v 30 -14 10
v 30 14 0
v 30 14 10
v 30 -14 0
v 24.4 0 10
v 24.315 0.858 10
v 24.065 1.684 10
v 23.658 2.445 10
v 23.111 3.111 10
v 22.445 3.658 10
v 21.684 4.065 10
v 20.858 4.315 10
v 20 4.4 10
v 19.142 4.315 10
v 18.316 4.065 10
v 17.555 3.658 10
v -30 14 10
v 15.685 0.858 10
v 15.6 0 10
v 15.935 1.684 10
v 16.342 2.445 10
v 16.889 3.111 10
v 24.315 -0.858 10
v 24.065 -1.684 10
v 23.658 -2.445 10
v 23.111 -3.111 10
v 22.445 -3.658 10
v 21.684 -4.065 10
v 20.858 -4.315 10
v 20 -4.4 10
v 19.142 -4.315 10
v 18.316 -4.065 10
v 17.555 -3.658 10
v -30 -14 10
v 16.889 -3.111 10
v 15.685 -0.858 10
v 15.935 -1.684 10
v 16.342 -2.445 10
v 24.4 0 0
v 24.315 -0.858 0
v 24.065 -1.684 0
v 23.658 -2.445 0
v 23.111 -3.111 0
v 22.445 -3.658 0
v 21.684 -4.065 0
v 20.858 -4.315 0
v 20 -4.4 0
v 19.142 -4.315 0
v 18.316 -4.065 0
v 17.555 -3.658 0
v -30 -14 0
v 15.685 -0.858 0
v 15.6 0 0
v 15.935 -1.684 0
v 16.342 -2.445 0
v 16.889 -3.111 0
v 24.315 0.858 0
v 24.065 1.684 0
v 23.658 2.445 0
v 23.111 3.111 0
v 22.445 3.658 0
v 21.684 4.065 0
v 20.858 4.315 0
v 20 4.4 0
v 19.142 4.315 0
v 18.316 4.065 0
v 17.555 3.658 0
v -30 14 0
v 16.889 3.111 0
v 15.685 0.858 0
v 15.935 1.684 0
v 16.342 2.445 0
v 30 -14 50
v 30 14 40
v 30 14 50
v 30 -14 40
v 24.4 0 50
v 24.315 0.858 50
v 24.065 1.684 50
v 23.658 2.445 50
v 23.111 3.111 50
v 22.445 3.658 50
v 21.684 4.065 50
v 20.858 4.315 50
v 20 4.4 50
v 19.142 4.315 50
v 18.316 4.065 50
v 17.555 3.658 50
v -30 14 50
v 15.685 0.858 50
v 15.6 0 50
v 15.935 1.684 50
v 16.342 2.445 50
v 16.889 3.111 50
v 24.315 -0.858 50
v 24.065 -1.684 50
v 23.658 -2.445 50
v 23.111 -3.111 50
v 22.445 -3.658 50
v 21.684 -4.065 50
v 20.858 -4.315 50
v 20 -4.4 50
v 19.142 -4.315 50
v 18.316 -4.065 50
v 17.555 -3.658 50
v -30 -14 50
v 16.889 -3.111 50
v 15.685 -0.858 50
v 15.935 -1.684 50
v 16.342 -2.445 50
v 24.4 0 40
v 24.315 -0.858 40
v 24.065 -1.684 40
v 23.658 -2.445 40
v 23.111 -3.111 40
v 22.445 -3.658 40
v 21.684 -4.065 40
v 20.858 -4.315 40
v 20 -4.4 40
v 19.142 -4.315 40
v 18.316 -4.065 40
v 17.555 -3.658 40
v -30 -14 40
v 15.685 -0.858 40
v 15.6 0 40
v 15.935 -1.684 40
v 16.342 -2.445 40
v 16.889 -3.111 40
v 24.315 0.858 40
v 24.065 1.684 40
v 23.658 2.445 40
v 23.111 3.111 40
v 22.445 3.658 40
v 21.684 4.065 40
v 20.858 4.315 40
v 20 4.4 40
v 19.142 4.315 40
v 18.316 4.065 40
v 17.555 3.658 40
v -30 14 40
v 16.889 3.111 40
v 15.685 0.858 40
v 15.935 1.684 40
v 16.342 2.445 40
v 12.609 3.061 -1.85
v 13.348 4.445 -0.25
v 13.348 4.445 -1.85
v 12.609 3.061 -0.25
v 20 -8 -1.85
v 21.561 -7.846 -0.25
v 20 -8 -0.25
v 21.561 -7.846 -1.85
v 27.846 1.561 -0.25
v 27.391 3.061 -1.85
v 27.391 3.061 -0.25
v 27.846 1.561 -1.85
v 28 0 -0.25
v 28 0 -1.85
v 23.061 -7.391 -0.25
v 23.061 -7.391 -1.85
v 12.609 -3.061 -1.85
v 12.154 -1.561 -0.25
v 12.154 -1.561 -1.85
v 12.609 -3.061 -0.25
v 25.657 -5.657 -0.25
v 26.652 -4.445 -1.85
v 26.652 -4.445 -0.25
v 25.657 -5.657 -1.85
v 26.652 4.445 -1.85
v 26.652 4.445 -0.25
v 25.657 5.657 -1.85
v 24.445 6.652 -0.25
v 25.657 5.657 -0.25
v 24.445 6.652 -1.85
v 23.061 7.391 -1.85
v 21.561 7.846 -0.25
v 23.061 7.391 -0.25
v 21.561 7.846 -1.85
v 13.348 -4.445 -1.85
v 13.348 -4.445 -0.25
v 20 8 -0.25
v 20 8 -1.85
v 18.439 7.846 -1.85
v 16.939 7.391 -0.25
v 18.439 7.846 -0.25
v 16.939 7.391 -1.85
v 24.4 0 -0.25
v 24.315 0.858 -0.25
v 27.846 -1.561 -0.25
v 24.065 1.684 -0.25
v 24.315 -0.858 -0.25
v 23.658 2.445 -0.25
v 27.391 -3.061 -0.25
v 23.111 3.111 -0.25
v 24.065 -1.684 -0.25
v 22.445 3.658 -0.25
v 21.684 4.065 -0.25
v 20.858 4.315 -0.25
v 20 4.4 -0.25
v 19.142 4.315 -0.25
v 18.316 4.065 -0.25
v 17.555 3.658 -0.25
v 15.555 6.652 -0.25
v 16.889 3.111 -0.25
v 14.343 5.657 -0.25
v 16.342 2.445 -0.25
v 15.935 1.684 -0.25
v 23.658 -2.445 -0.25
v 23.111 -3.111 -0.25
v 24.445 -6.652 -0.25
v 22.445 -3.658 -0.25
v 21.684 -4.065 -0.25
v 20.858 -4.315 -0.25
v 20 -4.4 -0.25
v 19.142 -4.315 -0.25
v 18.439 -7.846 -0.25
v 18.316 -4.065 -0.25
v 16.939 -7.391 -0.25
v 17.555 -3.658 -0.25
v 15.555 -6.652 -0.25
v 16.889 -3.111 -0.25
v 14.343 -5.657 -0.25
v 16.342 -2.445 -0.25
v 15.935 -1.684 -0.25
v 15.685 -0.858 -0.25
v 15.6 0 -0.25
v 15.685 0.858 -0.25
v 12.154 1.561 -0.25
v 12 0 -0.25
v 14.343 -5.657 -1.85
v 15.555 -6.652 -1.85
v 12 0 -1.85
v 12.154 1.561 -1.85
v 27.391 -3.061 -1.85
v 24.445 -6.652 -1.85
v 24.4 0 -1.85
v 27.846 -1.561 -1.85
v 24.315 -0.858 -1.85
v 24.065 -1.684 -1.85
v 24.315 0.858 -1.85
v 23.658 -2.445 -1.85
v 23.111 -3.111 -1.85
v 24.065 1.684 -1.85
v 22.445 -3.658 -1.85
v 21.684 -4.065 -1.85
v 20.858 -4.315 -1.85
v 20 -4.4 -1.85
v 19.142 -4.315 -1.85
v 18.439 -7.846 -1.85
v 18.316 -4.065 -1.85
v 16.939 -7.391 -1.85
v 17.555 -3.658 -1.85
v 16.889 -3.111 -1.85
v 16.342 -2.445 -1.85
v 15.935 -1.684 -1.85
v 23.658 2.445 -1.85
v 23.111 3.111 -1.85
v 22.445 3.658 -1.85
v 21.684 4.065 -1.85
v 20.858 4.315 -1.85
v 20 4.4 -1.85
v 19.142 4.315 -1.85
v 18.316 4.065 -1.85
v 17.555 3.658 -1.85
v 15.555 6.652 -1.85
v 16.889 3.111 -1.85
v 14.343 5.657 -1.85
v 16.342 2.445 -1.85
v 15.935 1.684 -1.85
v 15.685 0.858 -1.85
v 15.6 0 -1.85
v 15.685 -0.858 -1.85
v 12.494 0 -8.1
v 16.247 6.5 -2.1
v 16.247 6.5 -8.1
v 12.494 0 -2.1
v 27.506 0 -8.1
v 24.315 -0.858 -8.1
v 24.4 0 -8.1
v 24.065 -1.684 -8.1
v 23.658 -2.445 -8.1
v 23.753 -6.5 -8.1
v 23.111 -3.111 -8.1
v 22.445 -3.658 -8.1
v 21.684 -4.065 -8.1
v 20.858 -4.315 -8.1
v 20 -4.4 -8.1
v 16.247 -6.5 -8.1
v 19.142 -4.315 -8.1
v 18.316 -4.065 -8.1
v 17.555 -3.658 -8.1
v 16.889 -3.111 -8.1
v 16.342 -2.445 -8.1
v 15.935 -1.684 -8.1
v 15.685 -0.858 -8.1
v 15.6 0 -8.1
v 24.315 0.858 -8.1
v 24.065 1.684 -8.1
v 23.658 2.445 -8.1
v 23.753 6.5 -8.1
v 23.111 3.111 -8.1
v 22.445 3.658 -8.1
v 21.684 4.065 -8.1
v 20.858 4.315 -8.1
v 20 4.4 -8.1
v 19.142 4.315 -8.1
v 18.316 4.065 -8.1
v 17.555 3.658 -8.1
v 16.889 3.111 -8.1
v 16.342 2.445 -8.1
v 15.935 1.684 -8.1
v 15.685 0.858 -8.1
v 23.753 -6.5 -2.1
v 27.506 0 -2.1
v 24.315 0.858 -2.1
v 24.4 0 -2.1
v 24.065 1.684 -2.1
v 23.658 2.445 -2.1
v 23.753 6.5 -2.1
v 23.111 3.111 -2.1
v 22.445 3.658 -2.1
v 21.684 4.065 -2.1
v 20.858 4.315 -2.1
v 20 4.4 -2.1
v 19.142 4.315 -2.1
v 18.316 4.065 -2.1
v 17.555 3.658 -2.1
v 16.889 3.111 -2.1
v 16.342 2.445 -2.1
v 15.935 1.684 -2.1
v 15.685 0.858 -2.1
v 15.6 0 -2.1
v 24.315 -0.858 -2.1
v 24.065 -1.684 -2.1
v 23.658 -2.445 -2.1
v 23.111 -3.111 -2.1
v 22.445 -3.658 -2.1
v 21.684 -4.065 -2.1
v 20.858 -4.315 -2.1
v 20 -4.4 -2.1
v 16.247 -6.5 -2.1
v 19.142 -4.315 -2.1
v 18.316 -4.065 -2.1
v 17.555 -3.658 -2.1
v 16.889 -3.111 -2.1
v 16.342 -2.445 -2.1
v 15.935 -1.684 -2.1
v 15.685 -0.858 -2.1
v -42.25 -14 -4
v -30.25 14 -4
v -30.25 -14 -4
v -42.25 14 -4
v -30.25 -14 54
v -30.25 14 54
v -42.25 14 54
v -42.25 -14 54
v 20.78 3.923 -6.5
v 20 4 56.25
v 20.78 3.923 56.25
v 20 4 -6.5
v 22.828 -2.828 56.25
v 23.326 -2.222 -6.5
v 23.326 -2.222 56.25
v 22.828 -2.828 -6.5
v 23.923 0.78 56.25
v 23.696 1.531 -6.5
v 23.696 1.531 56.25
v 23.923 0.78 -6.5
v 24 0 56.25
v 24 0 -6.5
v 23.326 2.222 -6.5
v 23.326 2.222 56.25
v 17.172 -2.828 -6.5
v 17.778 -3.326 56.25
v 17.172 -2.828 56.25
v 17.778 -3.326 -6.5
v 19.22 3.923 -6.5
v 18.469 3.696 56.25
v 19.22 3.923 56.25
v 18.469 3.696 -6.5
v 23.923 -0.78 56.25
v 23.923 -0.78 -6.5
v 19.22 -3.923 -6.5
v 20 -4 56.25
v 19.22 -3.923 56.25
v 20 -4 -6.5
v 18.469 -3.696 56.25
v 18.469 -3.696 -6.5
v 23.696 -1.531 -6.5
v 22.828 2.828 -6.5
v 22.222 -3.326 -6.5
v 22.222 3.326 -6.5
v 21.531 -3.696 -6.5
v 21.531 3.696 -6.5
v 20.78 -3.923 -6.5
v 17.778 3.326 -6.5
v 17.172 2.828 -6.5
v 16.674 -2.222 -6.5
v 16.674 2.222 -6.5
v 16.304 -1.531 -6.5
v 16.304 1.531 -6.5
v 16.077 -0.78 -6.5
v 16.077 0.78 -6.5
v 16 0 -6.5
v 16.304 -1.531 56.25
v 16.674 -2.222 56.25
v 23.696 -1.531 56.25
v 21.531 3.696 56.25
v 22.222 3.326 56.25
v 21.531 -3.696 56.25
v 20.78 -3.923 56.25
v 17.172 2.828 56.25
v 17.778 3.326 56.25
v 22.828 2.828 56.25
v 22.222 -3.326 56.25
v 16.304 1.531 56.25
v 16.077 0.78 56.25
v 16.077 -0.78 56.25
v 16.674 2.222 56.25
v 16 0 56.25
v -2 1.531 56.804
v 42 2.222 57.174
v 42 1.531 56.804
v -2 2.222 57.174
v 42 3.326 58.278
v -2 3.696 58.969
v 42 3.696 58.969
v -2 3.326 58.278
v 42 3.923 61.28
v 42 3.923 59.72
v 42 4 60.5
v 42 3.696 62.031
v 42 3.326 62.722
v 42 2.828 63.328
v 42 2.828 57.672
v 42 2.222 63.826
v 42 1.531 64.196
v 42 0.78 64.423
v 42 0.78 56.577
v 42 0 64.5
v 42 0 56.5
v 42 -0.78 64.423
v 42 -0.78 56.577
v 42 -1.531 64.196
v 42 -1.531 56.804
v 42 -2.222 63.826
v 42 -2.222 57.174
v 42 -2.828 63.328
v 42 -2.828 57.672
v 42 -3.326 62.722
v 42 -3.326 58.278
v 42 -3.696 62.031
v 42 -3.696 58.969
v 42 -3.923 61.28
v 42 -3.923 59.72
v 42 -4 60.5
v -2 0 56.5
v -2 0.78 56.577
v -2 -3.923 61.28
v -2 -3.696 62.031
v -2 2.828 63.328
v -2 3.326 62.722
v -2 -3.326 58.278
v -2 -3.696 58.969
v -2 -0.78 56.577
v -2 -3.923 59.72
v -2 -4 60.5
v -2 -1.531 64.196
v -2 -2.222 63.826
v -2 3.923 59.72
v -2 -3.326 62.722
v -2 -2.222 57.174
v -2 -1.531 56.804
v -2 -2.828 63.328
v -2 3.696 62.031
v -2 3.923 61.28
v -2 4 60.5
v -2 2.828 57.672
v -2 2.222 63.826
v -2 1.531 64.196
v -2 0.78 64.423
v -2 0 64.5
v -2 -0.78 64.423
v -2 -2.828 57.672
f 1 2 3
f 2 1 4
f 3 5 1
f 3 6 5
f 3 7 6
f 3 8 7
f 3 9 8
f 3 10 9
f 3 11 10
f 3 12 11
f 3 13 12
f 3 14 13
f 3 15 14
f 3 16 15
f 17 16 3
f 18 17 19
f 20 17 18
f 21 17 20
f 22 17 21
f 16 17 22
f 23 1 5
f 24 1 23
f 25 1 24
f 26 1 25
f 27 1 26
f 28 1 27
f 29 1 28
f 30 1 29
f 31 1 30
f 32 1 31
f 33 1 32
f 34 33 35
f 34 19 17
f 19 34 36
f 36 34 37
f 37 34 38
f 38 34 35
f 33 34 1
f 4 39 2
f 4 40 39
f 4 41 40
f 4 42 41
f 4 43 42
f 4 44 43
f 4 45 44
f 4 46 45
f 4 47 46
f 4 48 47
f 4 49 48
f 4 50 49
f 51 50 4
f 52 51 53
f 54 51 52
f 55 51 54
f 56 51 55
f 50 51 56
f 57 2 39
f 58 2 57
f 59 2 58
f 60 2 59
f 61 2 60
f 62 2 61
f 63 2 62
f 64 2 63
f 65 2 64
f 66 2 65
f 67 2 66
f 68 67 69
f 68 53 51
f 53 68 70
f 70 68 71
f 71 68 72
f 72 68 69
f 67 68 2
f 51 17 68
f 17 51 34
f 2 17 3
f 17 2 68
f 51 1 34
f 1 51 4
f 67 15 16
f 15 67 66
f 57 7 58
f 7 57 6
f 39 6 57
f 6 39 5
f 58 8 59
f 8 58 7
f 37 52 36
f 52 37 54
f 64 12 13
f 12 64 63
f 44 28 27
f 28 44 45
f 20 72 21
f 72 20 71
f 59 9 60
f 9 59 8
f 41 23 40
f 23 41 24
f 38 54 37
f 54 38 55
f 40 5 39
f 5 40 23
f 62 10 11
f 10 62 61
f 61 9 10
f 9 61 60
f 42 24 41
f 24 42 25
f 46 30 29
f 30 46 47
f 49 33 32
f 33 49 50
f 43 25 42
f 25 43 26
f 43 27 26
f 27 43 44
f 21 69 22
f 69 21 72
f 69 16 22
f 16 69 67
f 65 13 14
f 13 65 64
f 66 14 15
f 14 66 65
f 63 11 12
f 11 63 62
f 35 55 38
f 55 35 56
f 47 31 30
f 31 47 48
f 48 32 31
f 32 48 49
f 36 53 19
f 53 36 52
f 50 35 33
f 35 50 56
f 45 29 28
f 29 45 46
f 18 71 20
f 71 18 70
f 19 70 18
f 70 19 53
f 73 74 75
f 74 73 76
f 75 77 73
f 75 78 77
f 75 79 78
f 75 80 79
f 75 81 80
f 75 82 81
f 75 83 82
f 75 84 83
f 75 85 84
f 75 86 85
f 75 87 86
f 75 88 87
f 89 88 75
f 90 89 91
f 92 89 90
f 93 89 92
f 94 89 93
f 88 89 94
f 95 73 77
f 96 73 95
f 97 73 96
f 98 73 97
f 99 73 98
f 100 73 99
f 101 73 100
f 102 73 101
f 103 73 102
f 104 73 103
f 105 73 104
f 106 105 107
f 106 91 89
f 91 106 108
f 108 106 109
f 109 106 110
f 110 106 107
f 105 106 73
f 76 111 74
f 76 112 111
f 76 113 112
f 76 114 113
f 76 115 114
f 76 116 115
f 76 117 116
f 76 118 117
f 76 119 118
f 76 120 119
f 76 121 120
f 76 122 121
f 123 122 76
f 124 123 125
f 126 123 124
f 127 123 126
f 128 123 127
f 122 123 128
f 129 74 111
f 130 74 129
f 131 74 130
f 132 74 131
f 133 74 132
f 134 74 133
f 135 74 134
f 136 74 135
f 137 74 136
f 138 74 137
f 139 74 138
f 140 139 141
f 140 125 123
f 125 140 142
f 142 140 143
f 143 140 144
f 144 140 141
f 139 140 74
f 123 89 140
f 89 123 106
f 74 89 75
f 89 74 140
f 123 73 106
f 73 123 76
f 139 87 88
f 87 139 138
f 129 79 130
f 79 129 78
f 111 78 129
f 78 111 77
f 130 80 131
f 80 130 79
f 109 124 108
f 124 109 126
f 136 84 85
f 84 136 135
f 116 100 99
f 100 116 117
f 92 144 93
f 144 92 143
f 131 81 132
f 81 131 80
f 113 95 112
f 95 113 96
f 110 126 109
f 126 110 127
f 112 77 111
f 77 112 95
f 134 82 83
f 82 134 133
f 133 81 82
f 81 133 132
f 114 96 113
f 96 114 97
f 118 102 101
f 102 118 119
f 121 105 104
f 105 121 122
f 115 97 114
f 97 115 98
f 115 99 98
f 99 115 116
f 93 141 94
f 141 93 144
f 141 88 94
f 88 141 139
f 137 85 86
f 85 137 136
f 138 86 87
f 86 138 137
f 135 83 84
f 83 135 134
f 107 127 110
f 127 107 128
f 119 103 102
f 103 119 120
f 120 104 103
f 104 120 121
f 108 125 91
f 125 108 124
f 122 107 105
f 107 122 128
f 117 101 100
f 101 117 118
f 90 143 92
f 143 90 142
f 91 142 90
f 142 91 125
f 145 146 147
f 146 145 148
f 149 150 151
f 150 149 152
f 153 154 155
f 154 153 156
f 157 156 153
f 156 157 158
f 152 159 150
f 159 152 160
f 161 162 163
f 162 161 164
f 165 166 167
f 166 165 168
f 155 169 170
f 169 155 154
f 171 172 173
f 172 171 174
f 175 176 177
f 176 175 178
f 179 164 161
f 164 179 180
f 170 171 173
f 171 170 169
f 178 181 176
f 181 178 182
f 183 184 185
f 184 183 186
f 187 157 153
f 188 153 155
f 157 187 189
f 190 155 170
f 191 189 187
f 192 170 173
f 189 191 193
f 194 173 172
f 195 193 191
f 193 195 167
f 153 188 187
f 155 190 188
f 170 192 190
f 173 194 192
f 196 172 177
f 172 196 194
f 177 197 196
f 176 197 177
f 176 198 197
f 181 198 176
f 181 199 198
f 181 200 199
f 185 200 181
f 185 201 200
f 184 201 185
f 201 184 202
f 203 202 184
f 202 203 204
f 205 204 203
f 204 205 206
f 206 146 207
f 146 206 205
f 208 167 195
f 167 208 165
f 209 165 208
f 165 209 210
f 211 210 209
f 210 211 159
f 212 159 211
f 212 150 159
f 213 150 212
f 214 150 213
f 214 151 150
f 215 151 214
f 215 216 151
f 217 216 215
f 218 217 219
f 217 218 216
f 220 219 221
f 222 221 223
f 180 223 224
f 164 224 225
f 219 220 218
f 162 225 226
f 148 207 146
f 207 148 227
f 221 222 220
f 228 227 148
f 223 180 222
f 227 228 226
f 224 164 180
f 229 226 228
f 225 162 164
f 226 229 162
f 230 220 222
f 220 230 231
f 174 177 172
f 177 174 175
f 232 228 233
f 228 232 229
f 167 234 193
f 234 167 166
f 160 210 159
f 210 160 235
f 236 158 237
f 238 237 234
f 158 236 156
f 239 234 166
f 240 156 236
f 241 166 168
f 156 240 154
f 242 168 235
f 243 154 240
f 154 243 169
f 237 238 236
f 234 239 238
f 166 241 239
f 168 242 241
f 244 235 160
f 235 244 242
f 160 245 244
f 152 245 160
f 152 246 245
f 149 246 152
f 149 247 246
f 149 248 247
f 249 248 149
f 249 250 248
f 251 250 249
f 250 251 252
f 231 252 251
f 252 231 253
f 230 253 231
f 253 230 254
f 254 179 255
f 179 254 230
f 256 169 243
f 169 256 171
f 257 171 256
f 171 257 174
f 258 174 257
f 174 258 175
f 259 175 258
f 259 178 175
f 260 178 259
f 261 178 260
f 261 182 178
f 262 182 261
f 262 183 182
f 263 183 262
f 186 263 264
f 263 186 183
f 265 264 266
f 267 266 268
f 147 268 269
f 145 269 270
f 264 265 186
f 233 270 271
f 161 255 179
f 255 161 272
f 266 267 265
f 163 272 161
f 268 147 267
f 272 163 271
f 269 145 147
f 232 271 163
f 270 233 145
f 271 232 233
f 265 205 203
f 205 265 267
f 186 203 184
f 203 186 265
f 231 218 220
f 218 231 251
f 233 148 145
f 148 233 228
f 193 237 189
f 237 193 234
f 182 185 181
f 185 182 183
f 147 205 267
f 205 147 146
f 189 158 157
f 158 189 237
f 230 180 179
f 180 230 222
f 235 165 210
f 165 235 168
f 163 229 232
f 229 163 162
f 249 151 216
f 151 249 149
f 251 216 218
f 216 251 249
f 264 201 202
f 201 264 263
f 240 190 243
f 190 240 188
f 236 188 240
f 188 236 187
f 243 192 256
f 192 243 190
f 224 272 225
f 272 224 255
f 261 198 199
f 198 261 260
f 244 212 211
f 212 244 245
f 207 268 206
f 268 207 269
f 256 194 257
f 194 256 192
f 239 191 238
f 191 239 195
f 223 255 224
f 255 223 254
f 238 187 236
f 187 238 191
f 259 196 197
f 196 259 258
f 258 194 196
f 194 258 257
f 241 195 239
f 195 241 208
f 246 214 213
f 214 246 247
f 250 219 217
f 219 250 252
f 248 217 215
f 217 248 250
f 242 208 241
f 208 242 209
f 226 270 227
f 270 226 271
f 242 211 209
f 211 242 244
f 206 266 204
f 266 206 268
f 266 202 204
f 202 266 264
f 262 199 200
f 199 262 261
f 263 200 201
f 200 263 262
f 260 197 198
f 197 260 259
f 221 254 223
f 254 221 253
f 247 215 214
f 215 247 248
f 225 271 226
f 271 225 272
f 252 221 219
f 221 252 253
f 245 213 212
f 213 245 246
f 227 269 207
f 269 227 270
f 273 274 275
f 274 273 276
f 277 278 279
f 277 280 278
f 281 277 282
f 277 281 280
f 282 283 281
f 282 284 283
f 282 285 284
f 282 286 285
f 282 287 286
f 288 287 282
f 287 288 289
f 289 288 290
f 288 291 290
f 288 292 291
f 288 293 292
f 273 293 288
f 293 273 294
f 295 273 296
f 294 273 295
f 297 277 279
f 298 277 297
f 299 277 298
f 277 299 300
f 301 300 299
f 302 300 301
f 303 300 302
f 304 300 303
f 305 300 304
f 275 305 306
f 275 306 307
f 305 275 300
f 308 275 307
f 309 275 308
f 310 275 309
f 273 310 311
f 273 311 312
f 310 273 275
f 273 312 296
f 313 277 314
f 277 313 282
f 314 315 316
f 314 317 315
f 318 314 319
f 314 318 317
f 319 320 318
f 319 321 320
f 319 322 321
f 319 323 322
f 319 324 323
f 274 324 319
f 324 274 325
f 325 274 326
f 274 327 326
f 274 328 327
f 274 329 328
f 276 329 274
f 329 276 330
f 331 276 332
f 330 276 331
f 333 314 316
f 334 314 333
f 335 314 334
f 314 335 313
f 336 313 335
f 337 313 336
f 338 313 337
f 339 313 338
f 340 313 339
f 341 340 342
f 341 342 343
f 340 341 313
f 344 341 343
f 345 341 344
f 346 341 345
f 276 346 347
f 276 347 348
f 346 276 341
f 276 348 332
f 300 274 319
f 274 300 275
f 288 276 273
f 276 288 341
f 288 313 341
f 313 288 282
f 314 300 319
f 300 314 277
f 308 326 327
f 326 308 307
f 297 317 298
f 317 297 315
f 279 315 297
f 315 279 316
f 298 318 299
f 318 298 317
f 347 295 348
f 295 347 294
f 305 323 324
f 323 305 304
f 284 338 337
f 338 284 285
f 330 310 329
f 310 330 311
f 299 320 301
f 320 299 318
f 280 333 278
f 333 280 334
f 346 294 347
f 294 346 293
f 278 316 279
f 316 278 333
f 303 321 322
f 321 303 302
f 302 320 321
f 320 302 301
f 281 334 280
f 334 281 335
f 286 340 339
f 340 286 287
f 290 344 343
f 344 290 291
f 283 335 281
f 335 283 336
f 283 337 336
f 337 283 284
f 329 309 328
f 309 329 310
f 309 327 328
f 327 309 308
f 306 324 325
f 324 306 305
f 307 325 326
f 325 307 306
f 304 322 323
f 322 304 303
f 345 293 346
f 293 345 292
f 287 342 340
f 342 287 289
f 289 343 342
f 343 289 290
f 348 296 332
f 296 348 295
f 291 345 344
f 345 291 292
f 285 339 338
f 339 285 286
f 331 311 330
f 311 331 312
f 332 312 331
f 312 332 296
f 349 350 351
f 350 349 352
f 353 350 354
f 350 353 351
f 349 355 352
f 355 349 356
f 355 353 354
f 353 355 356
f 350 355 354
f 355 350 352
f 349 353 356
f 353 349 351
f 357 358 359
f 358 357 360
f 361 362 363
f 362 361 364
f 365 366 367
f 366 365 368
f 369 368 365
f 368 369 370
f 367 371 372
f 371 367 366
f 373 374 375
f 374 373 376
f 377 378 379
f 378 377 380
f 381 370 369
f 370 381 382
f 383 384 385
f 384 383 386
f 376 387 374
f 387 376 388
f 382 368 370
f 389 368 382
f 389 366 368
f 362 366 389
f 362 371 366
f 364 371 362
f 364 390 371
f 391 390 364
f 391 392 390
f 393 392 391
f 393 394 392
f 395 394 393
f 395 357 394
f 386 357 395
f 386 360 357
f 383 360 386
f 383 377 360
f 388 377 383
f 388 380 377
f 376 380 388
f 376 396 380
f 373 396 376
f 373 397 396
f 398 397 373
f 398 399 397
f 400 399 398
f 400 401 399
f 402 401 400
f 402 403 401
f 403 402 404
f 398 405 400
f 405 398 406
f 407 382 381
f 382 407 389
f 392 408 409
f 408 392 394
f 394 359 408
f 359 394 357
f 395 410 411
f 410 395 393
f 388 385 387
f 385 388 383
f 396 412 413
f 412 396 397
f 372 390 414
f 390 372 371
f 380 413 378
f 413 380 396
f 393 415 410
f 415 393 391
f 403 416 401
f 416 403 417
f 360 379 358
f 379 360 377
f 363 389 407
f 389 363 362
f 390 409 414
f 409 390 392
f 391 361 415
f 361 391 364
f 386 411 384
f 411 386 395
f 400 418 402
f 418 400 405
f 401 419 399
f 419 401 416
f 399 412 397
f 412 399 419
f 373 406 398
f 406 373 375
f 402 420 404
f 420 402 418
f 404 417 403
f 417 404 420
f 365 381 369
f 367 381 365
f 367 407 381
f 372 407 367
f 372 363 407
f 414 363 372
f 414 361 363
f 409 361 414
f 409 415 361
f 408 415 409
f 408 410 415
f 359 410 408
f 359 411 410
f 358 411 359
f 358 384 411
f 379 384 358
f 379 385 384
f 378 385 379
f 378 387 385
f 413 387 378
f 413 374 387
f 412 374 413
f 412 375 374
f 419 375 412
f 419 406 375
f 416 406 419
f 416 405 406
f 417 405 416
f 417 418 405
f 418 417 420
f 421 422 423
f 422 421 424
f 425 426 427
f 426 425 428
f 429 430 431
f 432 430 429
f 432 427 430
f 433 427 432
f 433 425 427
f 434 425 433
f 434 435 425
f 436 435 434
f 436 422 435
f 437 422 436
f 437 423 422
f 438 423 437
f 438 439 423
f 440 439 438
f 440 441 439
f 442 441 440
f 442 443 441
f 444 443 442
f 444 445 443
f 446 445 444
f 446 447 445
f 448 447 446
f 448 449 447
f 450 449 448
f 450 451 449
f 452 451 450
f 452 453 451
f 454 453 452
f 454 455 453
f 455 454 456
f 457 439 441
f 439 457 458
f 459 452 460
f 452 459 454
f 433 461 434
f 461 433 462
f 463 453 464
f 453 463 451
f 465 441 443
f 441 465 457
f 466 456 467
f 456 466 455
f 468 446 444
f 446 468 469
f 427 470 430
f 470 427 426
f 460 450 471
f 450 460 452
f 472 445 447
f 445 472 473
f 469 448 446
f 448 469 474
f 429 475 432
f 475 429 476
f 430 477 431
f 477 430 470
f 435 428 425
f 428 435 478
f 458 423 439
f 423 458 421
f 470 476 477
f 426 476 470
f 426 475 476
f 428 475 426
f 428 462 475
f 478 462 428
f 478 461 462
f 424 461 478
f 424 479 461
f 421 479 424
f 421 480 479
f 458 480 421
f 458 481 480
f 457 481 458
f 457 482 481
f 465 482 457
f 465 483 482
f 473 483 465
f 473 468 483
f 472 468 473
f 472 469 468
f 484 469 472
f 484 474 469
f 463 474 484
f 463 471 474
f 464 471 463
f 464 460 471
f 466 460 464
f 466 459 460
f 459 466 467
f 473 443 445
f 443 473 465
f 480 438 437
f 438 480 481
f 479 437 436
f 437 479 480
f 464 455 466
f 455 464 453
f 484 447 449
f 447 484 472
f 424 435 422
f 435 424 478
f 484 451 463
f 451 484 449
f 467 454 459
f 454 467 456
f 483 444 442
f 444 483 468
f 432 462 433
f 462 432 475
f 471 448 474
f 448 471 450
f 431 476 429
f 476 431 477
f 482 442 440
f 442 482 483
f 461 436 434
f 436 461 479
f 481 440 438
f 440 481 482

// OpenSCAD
$fn = 32;

// ------------------------------------------------------------------------
// C clamp: throat 40 mm, screw d8
// Every part is its own module, assembly() places every instance.
// ------------------------------------------------------------------------

// --- part 1 ---
module clamp_arm() {
  difference() {
    translate([-30, -14, 0]) cube([60, 28, 10]);
    translate([20, 0, -1]) cylinder(h = 12, d = 8.8);
  }
}

// --- part 2 ---
module clamp_spine() {
  difference() {
    translate([-29, -14, 0]) cube([58, 28, 12]);
  }
}

// --- part 3 ---
module clamp_screw() {
  translate([0, 0, -31.375]) cylinder(h = 62.75, d = 8);
}

// --- part 4 ---
module clamp_washer() {
  difference() {
      translate([0, 0, 0]) cylinder(h = 1.6, d = 16);
      translate([0, 0, -1]) cylinder(h = 3.6, d = 8.8);
    }
}

// --- part 5 ---
module clamp_nut() {
  difference() {
    linear_extrude(height = 6) polygon(points = [[7.506, 0], [3.753, 6.5], [-3.753, 6.5], [-7.506, 0], [-3.753, -6.5], [3.753, -6.5]]);
    translate([0, 0, -1]) cylinder(h = 8, d = 8.8);
  }
}

// --- part 6 ---
module tommy_bar() {
  translate([0, 0, -22]) cylinder(h = 44, d = 8);
}

// --- assembly ---
module assembly() {
  color([0.80, 0.24, 0.20]) translate([0, 0, 0]) rotate([0, 0, 0]) clamp_arm();
  color([0.20, 0.45, 0.75]) translate([0, 0, 40]) rotate([0, 0, 0]) clamp_arm();
  color([0.25, 0.62, 0.32]) translate([-42.25, 0, 25]) rotate([0, 90, 0]) clamp_spine();
  color([0.92, 0.70, 0.18]) translate([20, 0, 24.875]) rotate([0, 0, 0]) clamp_screw();
  color([0.58, 0.35, 0.70]) translate([20, 0, -1.85]) rotate([0, 0, 0]) clamp_washer();
  color([0.16, 0.66, 0.66]) translate([20, 0, -8.1]) rotate([0, 0, 0]) clamp_nut();
  color([0.85, 0.48, 0.18]) translate([20, 0, 60.5]) rotate([0, 90, 0]) tommy_bar();
}

assembly();
